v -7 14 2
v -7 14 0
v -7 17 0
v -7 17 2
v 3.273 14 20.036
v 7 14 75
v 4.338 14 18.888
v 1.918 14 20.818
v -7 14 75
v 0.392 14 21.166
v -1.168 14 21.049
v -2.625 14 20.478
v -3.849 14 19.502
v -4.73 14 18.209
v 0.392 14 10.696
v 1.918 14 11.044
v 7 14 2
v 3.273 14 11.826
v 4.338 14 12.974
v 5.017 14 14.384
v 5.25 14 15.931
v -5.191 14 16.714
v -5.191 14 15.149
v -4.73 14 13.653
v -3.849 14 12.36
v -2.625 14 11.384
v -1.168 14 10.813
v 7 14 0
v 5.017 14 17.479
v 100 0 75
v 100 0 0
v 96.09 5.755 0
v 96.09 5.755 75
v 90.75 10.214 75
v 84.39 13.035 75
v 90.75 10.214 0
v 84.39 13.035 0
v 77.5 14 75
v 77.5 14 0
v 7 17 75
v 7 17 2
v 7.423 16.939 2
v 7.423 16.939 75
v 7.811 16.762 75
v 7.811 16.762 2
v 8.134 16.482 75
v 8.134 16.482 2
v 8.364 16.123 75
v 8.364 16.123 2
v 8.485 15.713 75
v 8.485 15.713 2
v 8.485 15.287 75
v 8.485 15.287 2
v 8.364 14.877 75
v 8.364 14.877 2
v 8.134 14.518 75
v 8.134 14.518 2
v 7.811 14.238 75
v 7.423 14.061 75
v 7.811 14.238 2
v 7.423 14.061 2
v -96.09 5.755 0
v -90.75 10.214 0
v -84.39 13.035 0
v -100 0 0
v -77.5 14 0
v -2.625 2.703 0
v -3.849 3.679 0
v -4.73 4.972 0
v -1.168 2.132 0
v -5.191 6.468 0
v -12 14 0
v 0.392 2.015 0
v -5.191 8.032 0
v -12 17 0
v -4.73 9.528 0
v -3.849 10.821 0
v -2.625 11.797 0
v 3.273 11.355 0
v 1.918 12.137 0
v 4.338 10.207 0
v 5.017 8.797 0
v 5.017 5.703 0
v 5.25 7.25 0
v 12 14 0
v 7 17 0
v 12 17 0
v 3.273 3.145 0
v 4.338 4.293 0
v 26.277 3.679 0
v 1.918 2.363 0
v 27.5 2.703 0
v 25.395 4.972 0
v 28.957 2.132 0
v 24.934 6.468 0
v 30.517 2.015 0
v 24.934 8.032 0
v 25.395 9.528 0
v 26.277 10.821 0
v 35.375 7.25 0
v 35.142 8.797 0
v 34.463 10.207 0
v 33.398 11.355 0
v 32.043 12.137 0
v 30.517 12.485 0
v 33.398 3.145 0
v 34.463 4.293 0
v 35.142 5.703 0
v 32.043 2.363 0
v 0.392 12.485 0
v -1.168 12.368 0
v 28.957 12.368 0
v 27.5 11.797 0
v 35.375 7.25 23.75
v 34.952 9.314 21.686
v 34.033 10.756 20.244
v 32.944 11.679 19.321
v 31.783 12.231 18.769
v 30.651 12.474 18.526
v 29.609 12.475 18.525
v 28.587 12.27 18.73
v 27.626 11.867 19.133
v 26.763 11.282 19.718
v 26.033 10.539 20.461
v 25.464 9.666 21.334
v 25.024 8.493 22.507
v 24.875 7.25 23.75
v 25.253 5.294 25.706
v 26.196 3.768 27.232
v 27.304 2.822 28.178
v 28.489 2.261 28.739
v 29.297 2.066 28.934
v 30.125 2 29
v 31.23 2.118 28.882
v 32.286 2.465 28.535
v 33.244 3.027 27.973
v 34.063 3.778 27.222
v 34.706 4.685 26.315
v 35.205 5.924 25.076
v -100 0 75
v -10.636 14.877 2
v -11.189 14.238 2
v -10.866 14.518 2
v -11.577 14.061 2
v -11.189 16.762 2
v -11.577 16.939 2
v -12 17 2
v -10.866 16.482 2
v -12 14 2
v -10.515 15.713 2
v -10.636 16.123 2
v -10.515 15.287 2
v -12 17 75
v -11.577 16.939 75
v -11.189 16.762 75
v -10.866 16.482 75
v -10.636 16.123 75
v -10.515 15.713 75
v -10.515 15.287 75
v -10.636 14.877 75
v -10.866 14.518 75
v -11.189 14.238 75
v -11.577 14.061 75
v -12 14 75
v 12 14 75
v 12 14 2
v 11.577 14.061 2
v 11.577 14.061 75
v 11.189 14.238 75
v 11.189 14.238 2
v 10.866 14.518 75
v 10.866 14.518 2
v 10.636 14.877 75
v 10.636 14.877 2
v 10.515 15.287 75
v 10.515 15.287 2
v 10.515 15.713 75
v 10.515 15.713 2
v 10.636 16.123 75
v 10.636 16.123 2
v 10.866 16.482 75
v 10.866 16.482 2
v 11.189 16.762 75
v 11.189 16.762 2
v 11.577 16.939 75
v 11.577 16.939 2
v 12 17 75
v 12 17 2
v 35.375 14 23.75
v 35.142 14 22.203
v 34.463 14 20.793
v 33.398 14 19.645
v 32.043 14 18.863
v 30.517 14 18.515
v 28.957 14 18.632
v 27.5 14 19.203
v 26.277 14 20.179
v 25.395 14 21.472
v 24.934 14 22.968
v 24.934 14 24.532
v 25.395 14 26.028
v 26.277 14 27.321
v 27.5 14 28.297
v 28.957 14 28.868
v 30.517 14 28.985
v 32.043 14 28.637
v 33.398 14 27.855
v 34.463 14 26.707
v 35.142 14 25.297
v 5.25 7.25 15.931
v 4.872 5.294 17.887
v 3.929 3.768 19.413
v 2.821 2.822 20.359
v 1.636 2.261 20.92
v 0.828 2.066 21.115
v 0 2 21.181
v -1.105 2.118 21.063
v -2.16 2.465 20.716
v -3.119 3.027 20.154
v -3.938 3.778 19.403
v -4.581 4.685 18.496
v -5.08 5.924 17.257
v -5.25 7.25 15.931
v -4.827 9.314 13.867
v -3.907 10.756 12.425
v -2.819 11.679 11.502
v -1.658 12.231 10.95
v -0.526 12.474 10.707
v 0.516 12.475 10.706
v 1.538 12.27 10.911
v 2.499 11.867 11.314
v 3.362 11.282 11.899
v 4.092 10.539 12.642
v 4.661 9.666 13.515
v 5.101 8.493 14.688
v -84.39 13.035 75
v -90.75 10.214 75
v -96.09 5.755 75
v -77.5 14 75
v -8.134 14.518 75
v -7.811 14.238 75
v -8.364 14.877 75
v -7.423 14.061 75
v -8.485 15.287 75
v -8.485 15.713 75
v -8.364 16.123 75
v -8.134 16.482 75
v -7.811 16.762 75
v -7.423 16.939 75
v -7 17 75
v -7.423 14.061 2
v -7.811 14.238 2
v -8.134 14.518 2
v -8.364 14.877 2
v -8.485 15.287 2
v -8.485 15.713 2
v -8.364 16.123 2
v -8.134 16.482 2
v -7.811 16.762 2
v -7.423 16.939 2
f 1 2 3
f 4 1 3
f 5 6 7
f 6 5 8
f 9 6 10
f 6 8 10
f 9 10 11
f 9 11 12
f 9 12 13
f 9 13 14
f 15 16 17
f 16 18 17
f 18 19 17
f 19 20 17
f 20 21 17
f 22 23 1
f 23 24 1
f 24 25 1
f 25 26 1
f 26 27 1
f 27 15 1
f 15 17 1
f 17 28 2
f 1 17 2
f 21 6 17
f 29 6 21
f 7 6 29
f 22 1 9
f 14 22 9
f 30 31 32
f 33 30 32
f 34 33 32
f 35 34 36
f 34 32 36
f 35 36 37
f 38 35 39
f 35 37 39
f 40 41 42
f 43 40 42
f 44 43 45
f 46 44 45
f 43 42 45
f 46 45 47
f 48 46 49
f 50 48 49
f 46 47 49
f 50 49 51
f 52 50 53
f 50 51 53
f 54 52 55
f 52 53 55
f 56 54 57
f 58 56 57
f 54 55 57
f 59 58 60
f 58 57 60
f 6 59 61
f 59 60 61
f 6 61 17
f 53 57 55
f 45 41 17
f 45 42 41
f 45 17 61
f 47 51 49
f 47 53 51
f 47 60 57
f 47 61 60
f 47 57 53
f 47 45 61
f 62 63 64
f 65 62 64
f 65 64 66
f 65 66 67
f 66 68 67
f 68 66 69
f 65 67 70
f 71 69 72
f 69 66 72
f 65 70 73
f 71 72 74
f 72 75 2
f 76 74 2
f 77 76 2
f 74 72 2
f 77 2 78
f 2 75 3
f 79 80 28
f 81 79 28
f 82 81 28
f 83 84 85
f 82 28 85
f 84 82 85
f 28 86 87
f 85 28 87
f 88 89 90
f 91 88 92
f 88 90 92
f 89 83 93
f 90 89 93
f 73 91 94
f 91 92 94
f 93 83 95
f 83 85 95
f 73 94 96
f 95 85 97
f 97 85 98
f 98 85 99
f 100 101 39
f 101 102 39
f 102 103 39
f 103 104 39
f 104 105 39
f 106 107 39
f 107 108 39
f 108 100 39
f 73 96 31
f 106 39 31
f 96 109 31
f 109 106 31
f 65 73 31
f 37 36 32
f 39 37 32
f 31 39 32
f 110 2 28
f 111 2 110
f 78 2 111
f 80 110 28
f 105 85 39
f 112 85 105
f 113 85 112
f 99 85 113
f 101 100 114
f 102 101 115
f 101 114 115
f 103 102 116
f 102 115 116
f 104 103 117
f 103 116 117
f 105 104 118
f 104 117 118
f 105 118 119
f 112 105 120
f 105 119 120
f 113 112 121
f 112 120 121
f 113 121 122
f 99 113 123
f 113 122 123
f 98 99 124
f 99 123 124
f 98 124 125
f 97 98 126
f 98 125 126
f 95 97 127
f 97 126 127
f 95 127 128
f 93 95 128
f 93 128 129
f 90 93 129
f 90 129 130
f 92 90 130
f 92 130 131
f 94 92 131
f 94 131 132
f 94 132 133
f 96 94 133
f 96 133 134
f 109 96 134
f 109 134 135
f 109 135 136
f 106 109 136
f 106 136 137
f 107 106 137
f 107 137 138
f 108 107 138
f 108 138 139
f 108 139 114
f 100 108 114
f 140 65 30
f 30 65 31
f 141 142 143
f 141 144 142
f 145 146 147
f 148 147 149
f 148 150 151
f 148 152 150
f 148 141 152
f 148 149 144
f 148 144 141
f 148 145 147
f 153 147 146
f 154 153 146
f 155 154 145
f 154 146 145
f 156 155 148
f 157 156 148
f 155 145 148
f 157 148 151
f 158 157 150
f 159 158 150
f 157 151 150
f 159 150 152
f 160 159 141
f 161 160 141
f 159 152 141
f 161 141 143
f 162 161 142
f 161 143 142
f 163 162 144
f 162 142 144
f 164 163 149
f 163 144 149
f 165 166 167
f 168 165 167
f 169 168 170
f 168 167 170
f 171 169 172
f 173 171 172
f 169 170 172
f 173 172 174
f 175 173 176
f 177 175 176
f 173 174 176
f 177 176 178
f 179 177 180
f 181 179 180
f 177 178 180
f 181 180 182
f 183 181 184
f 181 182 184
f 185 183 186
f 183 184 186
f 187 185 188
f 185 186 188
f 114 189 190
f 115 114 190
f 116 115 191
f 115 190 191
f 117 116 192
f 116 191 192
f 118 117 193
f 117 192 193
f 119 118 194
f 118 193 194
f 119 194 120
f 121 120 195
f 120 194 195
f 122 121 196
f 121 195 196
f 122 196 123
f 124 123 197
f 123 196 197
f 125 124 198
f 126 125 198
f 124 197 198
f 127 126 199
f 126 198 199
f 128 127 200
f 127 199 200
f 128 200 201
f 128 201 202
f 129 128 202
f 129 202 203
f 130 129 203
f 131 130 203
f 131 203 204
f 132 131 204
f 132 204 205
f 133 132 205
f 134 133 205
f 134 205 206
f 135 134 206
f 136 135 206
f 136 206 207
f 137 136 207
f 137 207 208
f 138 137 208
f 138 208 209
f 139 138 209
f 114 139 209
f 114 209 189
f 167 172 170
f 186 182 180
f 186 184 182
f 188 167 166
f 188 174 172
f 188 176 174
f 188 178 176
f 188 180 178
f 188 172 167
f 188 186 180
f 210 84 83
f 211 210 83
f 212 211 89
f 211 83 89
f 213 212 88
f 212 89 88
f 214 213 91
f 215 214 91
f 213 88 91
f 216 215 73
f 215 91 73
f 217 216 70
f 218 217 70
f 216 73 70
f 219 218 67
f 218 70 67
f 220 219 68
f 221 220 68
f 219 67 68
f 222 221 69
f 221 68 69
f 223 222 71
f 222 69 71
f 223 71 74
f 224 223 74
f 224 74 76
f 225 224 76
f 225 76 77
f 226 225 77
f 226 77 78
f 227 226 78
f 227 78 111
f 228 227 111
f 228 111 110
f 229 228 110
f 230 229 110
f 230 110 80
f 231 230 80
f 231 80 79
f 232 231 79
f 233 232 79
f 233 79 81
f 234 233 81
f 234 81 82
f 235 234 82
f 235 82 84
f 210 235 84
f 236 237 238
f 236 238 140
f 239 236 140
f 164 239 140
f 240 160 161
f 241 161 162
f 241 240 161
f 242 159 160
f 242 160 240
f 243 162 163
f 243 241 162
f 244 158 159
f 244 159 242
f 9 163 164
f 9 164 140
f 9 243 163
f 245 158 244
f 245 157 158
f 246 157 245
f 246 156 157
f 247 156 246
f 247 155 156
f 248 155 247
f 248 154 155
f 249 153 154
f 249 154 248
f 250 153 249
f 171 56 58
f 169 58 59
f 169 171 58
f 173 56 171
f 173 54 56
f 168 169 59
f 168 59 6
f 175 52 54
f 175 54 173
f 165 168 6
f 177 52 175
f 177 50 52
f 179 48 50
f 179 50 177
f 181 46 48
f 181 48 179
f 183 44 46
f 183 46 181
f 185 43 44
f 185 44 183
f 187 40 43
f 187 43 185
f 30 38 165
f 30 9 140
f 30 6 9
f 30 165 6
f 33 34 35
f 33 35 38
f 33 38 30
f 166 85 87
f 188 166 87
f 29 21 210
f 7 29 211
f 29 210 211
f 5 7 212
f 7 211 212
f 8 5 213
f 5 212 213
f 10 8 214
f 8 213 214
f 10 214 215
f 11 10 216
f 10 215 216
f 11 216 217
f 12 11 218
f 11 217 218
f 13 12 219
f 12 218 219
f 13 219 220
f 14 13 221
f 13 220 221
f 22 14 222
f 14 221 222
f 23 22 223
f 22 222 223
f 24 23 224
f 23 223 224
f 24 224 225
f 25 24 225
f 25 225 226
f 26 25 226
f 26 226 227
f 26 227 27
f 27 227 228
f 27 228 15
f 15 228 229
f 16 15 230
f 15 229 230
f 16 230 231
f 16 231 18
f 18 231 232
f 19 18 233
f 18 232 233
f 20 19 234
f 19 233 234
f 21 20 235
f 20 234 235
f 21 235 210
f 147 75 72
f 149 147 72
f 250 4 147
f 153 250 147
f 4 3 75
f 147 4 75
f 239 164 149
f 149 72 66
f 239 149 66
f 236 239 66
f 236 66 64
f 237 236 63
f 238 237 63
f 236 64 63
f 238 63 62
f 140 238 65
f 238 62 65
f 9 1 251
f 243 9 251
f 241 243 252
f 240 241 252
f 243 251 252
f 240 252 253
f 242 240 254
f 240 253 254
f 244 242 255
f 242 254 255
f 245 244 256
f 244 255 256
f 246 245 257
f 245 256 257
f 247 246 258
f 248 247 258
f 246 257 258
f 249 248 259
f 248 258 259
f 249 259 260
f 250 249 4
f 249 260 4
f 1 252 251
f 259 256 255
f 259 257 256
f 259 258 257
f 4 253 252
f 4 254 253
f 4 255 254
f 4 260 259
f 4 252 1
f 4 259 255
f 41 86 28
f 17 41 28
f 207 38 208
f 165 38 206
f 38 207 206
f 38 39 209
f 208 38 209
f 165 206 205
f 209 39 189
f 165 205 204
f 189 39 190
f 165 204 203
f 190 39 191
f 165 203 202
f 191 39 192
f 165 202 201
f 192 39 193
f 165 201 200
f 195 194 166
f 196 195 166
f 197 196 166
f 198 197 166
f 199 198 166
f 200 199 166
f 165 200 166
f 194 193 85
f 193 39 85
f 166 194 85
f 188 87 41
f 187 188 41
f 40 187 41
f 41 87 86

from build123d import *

# Parameters (mm, degrees)
F0_R     = 5.25
F1_DEPTH = 75
F4_DEPTH = 2


# Not quite as in the source:
# - a feature names something its author has since deleted; it is built from what else it names


with BuildPart() as f1:
    # F0 (on Top) → F1 (new body)
    with BuildSketch(Plane.XY):
        with BuildLine():
            Line((-100, 0), (-13.8524602948, 0))
            Line((-13.8524602948, 0), (12.09906023, 0))
            Line((12.09906023, 0), (100, 0))
            ThreePointArc((100, 0), (90.75, 10.2142857143), (77.5, 14))
            Line((77.5, 14), (32.5911540906, 14))
            Line((32.5911540906, 14), (26.9999997473, 14))
            Line((26.9999997473, 14), (11.9999997473, 14))
            Line((11.9999997473, 14), (7, 14))
            Line((7, 14), (-7, 14))
            Line((-7, 14), (-11.9999997473, 14))
            Line((-11.9999997473, 14), (-77.5, 14))
            ThreePointArc((-77.5, 14), (-90.75, 10.2142857143), (-100, 0))
        make_face()
        with Locations((0, 7.25)):
            Circle(F0_R, mode=Mode.SUBTRACT)
        with Locations((30.1251118069, 7.25)):
            Circle(F0_R, mode=Mode.SUBTRACT)
        with Locations((30.1251118069, 7.25)):
            Circle(F0_R)
        with BuildLine():
            ThreePointArc((-11.9999997473, 17), (-10.4999997473, 15.5), (-11.9999997473, 14))
            Line((-11.9999997473, 14), (-7, 14))
            ThreePointArc((-7, 14), (-8.5, 15.5000001263), (-6.9999997473, 17))
            Line((-6.9999997473, 17), (-11.9999997473, 17))
        make_face()
        with BuildLine():
            ThreePointArc((6.9999998542, 17), (8.5, 15.5000000729), (7, 14))
            Line((7, 14), (11.9999997473, 14))
            ThreePointArc((11.9999997473, 14), (10.4999997473, 15.5), (11.9999997473, 17))
            Line((11.9999997473, 17), (6.9999998542, 17))
        make_face()
        with Locations((0, 7.25)):
            Circle(F0_R)
    extrude(amount=F1_DEPTH)

    # F0 (on Top) → F4 (join)
    with BuildSketch(Plane.XY):
        with BuildLine():
            ThreePointArc((11.9999997473, 17), (10.4999997473, 15.5), (11.9999997473, 14))
            Line((11.9999997473, 14), (11.9999997473, 17))
        make_face()
        with BuildLine():
            Line((6.9999998542, 17), (7, 14))
            ThreePointArc((7, 14), (8.5, 15.5000000729), (6.9999998542, 17))
        make_face()
        with BuildLine():
            ThreePointArc((-6.9999997473, 17), (-8.5, 15.5000001263), (-7, 14))
            Line((-7, 14), (-6.9999997473, 17))
        make_face()
        with BuildLine():
            Line((-11.9999997473, 17), (-11.9999997473, 14))
            ThreePointArc((-11.9999997473, 14), (-10.4999997473, 15.5), (-11.9999997473, 17))
        make_face()
        with BuildLine():
            ThreePointArc((-11.9999997473, 17), (-10.4999997473, 15.5), (-11.9999997473, 14))
            Line((-11.9999997473, 14), (-7, 14))
            ThreePointArc((-7, 14), (-8.5, 15.5000001263), (-6.9999997473, 17))
            Line((-6.9999997473, 17), (-11.9999997473, 17))
        make_face()
        with BuildLine():
            ThreePointArc((6.9999998542, 17), (8.5, 15.5000000729), (7, 14))
            Line((7, 14), (11.9999997473, 14))
            ThreePointArc((11.9999997473, 14), (10.4999997473, 15.5), (11.9999997473, 17))
            Line((11.9999997473, 17), (6.9999998542, 17))
        make_face()
    extrude(amount=F4_DEPTH)

    # F5: sweep along a path in F3
    with BuildLine(Plane.YZ.offset(30.1251118069)) as f5_path:
        Line((8, 0), (8, 23))
        Line((8, 23), (14, 23))
    # F0 (on Top) → F5 (sweep, cut)
    with BuildSketch(Plane.XY):
        with Locations((30.1251118069, 7.25)):
            Circle(F0_R)
    sweep(path=f5_path.line, transition=Transition.RIGHT, mode=Mode.SUBTRACT)

    # F7: sweep along a path in F6
    with BuildLine(Plane.YZ) as f7_path:
        Line((23.7799418298, 13.885), (9.2960403562, 13.885))
        Line((9.2960403562, 13.885), (9.2960403562, 0))
    # F0 (on Top) → F7 (sweep, cut)
    with BuildSketch(Plane.XY):
        with Locations((0, 7.25)):
            Circle(F0_R)
    sweep(path=f7_path.line, transition=Transition.RIGHT, mode=Mode.SUBTRACT)


solid = f1.part
